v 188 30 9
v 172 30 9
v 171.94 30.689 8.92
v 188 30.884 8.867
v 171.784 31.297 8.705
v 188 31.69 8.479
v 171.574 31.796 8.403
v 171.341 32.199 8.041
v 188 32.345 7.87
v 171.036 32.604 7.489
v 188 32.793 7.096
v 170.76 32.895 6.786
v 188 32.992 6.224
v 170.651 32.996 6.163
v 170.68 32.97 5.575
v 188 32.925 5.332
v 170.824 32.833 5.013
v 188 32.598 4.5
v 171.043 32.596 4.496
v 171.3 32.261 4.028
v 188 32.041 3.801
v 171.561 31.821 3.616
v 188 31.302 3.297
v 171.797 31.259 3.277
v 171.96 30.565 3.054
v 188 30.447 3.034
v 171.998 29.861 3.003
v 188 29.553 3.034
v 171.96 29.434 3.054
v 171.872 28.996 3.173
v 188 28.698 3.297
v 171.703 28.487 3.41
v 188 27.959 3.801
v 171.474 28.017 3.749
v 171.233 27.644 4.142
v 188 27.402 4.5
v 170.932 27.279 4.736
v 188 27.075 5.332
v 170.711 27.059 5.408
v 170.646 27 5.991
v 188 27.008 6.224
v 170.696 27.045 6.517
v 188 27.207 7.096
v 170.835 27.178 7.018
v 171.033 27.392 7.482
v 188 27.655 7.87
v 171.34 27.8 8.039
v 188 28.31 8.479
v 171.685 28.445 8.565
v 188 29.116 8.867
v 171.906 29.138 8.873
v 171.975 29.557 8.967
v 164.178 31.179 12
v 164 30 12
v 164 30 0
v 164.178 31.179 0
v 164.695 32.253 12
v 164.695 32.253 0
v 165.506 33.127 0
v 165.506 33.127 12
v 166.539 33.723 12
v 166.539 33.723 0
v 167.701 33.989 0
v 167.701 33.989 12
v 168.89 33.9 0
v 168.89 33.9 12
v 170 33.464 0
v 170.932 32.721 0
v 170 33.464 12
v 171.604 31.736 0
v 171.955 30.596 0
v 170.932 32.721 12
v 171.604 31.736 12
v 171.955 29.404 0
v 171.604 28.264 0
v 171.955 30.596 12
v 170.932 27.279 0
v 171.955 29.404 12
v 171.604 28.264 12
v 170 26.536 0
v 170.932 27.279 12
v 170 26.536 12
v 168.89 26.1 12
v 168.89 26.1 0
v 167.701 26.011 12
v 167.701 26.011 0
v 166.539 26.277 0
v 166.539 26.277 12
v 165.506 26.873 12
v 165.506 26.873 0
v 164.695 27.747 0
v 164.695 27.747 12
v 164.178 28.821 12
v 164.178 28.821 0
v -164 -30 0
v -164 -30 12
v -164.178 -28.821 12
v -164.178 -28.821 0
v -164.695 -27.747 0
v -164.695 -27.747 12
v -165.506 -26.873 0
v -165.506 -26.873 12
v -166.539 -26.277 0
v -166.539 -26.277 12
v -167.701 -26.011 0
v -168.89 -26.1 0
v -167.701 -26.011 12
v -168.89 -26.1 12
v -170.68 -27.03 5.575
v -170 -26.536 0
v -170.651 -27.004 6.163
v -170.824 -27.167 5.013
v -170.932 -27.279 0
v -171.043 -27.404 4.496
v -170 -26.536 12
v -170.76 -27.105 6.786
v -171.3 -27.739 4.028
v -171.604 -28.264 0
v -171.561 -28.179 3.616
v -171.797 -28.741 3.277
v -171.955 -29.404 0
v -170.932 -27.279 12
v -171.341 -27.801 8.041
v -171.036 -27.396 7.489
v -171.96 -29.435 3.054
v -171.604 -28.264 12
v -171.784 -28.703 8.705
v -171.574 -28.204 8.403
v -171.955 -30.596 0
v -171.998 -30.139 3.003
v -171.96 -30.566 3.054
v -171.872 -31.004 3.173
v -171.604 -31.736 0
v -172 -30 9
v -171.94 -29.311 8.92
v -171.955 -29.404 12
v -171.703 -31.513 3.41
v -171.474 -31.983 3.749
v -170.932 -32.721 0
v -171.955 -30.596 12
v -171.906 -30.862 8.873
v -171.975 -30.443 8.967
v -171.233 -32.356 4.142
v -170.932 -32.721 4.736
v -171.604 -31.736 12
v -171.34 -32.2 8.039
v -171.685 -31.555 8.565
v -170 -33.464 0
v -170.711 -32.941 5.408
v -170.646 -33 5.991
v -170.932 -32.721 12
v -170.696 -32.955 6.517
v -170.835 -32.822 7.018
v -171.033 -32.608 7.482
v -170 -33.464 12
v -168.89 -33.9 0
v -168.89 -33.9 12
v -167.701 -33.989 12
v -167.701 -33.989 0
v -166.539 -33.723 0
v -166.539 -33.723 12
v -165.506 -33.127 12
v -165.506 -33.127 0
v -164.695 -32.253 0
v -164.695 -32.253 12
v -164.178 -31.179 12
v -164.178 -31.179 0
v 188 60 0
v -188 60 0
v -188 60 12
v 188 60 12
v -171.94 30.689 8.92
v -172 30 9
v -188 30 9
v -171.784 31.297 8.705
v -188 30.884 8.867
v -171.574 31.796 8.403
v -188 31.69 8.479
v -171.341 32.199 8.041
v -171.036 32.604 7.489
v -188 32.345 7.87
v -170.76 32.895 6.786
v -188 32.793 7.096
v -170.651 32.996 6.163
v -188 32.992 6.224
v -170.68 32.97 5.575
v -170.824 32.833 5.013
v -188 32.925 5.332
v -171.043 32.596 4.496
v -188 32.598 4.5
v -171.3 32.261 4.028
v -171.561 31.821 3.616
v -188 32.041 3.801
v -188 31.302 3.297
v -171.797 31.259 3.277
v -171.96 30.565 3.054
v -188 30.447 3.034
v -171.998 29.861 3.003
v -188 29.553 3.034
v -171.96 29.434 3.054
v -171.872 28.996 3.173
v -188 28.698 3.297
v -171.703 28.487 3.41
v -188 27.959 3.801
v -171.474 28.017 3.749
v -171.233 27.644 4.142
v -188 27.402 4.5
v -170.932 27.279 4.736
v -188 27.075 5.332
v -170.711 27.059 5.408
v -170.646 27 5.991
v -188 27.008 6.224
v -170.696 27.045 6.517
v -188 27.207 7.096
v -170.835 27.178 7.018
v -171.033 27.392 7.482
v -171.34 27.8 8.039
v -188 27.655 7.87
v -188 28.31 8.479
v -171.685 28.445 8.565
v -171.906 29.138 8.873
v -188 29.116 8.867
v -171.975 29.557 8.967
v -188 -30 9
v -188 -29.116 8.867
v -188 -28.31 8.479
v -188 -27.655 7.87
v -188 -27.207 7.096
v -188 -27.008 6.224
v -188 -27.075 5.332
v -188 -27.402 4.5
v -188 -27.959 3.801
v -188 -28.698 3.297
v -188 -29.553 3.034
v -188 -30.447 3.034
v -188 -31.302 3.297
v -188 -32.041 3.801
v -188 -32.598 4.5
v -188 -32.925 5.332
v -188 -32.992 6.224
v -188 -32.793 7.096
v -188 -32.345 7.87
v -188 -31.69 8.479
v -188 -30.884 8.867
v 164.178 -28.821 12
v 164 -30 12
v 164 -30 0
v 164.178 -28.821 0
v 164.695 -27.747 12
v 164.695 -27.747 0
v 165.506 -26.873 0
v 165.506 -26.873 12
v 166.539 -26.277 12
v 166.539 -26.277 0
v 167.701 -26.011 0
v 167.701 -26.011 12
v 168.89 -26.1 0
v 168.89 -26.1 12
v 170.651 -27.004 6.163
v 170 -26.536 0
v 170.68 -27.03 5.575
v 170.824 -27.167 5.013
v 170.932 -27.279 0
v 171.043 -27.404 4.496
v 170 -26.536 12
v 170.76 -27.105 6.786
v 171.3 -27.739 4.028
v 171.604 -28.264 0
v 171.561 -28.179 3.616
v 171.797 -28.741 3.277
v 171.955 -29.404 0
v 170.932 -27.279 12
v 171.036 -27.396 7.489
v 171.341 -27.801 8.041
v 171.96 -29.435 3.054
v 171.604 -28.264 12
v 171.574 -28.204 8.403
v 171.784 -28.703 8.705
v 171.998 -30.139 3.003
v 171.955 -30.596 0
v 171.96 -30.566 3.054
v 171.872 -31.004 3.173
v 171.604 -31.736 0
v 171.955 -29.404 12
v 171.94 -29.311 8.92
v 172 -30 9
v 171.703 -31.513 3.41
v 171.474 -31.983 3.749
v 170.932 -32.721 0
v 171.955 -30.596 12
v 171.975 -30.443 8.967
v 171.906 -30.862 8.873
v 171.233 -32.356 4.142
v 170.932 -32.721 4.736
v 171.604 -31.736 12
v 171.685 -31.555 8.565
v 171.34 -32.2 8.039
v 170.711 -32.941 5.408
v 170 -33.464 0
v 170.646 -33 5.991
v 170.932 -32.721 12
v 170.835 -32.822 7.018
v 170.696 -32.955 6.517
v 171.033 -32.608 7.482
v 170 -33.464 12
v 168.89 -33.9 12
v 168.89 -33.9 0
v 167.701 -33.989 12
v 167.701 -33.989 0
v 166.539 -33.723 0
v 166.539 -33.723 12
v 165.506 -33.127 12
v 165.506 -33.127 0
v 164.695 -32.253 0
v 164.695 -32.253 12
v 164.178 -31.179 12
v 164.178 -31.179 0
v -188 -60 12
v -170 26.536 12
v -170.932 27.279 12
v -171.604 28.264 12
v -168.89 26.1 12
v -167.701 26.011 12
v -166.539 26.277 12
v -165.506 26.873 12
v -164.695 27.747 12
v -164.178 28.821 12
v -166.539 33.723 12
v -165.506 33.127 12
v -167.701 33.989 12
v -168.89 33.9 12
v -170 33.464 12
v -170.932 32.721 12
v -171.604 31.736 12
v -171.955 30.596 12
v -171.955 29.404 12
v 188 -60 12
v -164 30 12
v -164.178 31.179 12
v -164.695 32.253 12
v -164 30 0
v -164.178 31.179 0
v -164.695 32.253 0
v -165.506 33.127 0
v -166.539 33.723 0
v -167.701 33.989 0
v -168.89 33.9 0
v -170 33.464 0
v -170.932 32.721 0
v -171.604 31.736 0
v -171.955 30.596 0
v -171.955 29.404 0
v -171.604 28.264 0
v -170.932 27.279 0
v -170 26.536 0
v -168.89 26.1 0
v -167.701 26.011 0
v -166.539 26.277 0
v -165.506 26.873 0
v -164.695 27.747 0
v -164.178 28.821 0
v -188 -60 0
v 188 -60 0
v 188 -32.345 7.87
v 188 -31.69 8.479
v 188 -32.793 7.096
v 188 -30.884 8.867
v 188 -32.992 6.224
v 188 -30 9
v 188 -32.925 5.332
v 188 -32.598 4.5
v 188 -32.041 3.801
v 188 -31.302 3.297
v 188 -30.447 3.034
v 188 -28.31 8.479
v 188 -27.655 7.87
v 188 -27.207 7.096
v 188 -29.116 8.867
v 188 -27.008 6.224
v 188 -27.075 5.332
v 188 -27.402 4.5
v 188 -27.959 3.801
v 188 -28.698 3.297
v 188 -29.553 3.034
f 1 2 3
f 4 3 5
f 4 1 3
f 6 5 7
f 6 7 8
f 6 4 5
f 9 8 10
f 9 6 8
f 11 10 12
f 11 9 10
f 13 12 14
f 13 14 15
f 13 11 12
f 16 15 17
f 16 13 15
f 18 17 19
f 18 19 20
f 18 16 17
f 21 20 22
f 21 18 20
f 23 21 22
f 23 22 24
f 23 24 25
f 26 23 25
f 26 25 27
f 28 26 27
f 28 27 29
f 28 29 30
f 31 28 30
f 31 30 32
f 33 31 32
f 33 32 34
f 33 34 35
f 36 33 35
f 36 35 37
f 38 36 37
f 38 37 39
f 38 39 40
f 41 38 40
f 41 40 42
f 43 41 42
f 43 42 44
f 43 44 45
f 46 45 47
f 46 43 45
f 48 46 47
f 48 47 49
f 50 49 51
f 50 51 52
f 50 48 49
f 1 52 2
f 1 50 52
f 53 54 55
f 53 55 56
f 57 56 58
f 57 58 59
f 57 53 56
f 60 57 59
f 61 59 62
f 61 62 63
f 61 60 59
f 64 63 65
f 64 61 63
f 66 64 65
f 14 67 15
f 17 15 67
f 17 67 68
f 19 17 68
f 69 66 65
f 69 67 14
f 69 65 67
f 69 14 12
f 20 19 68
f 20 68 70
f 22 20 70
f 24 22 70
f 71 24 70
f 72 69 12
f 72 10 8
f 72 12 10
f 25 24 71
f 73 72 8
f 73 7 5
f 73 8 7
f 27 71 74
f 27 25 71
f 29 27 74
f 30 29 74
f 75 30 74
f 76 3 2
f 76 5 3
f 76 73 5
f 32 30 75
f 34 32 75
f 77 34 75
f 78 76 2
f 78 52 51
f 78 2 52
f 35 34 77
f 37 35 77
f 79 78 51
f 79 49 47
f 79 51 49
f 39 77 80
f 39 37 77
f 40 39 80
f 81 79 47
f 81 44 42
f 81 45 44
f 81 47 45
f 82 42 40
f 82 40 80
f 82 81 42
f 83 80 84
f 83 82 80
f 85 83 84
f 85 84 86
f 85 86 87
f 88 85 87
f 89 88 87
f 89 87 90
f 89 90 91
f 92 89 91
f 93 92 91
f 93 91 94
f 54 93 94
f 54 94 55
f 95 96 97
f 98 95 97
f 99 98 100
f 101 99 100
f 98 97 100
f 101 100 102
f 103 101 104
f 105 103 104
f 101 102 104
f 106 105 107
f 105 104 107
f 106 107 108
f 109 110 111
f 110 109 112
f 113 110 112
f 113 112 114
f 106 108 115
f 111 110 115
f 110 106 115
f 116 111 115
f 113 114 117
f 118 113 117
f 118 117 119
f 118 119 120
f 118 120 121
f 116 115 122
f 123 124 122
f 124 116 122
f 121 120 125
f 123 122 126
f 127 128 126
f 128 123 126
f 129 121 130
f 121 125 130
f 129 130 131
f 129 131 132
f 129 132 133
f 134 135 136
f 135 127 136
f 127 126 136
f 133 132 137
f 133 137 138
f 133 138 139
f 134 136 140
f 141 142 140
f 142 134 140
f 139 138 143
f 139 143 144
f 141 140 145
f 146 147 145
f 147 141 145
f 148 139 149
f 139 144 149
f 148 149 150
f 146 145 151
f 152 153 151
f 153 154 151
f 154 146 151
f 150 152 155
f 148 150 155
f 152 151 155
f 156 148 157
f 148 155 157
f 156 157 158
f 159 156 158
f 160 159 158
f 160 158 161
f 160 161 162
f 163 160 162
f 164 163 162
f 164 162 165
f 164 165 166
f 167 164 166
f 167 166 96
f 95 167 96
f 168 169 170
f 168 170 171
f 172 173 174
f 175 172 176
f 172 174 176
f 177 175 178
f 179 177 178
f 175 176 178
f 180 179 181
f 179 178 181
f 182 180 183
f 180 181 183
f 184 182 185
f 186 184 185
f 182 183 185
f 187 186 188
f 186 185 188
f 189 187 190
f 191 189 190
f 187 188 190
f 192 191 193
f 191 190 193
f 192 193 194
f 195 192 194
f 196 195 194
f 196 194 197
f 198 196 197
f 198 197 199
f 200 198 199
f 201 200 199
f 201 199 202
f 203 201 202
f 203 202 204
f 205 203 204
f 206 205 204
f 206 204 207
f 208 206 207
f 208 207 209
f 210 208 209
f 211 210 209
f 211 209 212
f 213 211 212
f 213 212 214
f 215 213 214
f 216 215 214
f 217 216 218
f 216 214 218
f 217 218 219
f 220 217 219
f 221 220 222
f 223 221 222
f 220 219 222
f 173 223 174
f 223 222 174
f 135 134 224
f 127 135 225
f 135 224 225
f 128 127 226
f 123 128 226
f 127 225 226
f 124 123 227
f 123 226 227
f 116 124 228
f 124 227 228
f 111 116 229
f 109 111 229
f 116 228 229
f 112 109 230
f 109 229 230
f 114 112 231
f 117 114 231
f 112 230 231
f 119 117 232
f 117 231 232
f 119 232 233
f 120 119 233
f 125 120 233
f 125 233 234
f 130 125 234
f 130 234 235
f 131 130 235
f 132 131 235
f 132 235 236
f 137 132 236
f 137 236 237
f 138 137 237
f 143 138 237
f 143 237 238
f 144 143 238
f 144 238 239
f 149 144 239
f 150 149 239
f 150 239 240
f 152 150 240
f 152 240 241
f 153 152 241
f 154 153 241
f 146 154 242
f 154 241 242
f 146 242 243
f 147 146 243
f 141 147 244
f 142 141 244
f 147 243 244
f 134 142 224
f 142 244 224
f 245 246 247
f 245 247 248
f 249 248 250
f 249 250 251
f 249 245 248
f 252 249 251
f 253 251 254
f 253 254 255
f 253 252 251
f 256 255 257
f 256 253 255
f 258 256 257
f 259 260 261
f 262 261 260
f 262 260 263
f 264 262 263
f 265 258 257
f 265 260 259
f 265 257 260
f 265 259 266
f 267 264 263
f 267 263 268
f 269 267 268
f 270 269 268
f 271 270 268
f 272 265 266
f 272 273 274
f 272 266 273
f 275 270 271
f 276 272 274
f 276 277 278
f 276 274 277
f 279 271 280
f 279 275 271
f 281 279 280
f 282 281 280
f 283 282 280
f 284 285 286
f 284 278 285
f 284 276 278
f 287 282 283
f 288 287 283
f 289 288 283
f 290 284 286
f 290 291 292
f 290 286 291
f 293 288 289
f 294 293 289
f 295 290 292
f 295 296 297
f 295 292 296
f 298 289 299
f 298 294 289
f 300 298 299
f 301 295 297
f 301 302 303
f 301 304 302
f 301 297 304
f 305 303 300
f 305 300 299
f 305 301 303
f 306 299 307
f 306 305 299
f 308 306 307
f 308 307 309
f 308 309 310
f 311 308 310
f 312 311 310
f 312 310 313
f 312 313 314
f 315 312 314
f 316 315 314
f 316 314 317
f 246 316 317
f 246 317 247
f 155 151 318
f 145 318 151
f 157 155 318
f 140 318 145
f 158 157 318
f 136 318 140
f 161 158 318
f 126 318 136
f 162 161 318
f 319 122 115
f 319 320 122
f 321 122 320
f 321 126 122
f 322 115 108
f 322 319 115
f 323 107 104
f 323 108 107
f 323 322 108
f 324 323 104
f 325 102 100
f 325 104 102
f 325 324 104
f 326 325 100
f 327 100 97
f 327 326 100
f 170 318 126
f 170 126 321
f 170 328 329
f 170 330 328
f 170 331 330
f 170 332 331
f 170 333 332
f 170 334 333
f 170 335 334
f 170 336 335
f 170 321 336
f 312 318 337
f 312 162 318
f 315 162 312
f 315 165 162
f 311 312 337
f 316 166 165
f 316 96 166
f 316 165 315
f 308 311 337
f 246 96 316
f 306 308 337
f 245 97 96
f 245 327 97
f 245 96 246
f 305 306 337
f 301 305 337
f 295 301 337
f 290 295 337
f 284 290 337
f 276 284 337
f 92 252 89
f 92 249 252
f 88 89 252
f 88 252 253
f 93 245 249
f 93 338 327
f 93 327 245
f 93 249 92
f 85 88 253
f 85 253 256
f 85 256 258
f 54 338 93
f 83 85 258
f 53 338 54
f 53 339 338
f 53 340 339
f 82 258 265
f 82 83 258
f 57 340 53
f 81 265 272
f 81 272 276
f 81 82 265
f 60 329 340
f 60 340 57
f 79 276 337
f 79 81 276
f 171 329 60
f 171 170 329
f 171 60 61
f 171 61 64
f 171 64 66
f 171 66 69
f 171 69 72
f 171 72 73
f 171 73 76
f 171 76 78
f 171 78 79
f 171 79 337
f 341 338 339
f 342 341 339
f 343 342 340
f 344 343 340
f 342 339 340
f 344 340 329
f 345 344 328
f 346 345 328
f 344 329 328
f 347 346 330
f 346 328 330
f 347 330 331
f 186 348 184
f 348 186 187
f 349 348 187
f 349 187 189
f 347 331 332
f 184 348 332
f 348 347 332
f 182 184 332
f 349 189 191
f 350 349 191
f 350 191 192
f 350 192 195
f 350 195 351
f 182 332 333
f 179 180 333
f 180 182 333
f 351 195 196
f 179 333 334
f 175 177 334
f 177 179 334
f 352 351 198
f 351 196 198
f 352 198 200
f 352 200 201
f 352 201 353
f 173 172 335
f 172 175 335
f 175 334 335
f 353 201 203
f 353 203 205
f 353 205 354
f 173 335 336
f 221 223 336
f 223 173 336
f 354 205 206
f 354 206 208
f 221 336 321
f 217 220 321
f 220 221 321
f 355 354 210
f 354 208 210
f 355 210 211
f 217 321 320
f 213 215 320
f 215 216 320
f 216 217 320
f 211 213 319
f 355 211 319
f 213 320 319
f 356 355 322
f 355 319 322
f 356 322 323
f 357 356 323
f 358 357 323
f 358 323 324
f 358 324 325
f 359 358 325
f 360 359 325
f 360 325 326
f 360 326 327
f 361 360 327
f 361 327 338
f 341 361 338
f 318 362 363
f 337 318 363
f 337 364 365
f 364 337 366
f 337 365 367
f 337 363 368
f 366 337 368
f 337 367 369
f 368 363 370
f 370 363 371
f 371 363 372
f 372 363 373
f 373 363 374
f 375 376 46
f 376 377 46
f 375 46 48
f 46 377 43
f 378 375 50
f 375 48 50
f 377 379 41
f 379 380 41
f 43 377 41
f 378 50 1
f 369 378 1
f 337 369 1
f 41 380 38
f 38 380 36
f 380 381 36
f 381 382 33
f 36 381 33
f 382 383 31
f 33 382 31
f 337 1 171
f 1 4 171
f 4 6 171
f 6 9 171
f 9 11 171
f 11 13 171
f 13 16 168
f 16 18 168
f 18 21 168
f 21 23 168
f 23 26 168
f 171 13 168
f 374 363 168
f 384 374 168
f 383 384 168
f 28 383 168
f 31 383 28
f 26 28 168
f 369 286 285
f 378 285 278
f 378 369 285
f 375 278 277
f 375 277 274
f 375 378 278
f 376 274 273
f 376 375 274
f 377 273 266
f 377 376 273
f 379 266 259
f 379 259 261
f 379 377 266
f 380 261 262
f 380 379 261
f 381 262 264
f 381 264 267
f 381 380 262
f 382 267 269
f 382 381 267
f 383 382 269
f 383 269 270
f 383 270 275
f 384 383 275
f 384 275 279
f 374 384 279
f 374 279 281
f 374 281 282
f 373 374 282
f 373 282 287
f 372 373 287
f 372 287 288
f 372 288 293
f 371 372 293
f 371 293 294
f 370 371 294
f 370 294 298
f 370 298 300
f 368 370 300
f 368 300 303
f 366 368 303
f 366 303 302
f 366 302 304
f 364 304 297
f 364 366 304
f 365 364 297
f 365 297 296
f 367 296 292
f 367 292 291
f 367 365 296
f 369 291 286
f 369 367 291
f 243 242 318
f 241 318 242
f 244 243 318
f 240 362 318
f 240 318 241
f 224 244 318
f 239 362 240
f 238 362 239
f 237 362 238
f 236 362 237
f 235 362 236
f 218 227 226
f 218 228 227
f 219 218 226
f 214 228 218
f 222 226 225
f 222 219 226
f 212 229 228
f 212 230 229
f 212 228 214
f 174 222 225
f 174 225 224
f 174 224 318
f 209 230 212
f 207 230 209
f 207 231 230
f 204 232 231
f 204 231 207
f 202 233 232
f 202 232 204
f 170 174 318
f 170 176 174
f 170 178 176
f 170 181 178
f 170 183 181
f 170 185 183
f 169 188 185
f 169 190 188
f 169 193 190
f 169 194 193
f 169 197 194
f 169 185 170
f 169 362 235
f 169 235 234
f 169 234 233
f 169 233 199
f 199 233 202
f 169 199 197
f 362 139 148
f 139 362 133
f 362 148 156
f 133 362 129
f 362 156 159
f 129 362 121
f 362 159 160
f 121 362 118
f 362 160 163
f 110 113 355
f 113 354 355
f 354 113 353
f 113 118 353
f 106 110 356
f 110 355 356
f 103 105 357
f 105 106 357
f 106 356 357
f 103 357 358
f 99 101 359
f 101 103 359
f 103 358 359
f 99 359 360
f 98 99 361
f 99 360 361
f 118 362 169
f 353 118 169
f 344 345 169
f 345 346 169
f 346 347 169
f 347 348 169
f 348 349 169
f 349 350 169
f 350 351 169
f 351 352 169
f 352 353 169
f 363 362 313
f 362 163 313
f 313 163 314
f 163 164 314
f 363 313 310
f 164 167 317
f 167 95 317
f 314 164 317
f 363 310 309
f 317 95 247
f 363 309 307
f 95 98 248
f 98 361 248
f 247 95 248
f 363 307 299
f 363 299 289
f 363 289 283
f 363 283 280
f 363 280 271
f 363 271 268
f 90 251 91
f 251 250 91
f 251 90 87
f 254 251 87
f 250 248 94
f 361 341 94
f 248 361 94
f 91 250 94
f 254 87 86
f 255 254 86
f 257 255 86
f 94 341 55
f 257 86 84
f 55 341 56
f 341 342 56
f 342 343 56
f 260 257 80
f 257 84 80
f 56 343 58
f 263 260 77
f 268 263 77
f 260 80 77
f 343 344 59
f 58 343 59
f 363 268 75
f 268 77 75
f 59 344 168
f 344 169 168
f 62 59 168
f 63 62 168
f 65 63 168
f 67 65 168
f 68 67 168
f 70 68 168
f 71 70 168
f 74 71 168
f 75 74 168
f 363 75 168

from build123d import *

# Parameters (mm, degrees)
SKETCH1_W           = 376
SKETCH1_H           = 120
BOSS_EXTRUDE1_DEPTH = 12
CUT_EXTRUDE1_REACH  = 199.707
SKETCH2_R           = 4
CUT_EXTRUDE2_REACH  = 382.946
SKETCH3_R           = 3


with BuildPart() as part:
    # Sketch1 → Boss-Extrude1 (new body)
    with BuildSketch(Plane.XY):
        Rectangle(SKETCH1_W, SKETCH1_H)
    extrude(amount=BOSS_EXTRUDE1_DEPTH)

    # Sketch2 → Cut-Extrude1 (cut, up to next)
    with BuildSketch(Plane.XY.offset(12), mode=Mode.PRIVATE) as cut_extrude1_sk1:
        with Locations((-168, 30)):
            Circle(SKETCH2_R)
    cut_extrude1_tool1 = extrude(cut_extrude1_sk1.sketch, amount=-CUT_EXTRUDE1_REACH, mode=Mode.PRIVATE) & part.part
    # Sketch2 → Cut-Extrude1 (cut, up to next)
    with BuildSketch(Plane.XY.offset(12), mode=Mode.PRIVATE) as cut_extrude1_sk2:
        with Locations((-168, -30)):
            Circle(SKETCH2_R)
    cut_extrude1_tool2 = extrude(cut_extrude1_sk2.sketch, amount=-CUT_EXTRUDE1_REACH, mode=Mode.PRIVATE) & part.part
    cut_extrude1_1 = cut_extrude1_tool1.solids().sort_by_distance((-168, 30, 12))[0]
    add(cut_extrude1_1, mode=Mode.SUBTRACT)
    cut_extrude1_2 = cut_extrude1_tool2.solids().sort_by_distance((-168, -30, 12))[0]
    add(cut_extrude1_2, mode=Mode.SUBTRACT)
    cut_extrude1 = cut_extrude1_1 + cut_extrude1_2  # Cut-Extrude1 as one shape, for the pattern or mirror that repeats it

    # Sketch3 → Cut-Extrude2 (cut, up to next)
    with BuildSketch(Plane.ZY.offset(188), mode=Mode.PRIVATE) as cut_extrude2_sk1:
        with Locations((6, 30)):
            Circle(SKETCH3_R)
    cut_extrude2_tool1 = extrude(cut_extrude2_sk1.sketch, amount=-CUT_EXTRUDE2_REACH, mode=Mode.PRIVATE) & part.part
    # Sketch3 → Cut-Extrude2 (cut, up to next)
    with BuildSketch(Plane.ZY.offset(188), mode=Mode.PRIVATE) as cut_extrude2_sk2:
        with Locations((6, -30)):
            Circle(SKETCH3_R)
    cut_extrude2_tool2 = extrude(cut_extrude2_sk2.sketch, amount=-CUT_EXTRUDE2_REACH, mode=Mode.PRIVATE) & part.part
    cut_extrude2_1 = cut_extrude2_tool1.solids().sort_by_distance((-188, 30, 6))[0]
    add(cut_extrude2_1, mode=Mode.SUBTRACT)
    cut_extrude2_2 = cut_extrude2_tool2.solids().sort_by_distance((-188, -30, 6))[0]
    add(cut_extrude2_2, mode=Mode.SUBTRACT)
    cut_extrude2 = cut_extrude2_1 + cut_extrude2_2  # Cut-Extrude2 as one shape, for the pattern or mirror that repeats it

    # Mirror1: Cut-Extrude1, Cut-Extrude2 across plane
    add(cut_extrude1.mirror(Plane(origin=(0, 0, 0), x_dir=(0, 0, 1), z_dir=(1, 0, 0))), mode=Mode.SUBTRACT)
    add(cut_extrude2.mirror(Plane(origin=(0, 0, 0), x_dir=(0, 0, 1), z_dir=(1, 0, 0))), mode=Mode.SUBTRACT)


solid = part.part
